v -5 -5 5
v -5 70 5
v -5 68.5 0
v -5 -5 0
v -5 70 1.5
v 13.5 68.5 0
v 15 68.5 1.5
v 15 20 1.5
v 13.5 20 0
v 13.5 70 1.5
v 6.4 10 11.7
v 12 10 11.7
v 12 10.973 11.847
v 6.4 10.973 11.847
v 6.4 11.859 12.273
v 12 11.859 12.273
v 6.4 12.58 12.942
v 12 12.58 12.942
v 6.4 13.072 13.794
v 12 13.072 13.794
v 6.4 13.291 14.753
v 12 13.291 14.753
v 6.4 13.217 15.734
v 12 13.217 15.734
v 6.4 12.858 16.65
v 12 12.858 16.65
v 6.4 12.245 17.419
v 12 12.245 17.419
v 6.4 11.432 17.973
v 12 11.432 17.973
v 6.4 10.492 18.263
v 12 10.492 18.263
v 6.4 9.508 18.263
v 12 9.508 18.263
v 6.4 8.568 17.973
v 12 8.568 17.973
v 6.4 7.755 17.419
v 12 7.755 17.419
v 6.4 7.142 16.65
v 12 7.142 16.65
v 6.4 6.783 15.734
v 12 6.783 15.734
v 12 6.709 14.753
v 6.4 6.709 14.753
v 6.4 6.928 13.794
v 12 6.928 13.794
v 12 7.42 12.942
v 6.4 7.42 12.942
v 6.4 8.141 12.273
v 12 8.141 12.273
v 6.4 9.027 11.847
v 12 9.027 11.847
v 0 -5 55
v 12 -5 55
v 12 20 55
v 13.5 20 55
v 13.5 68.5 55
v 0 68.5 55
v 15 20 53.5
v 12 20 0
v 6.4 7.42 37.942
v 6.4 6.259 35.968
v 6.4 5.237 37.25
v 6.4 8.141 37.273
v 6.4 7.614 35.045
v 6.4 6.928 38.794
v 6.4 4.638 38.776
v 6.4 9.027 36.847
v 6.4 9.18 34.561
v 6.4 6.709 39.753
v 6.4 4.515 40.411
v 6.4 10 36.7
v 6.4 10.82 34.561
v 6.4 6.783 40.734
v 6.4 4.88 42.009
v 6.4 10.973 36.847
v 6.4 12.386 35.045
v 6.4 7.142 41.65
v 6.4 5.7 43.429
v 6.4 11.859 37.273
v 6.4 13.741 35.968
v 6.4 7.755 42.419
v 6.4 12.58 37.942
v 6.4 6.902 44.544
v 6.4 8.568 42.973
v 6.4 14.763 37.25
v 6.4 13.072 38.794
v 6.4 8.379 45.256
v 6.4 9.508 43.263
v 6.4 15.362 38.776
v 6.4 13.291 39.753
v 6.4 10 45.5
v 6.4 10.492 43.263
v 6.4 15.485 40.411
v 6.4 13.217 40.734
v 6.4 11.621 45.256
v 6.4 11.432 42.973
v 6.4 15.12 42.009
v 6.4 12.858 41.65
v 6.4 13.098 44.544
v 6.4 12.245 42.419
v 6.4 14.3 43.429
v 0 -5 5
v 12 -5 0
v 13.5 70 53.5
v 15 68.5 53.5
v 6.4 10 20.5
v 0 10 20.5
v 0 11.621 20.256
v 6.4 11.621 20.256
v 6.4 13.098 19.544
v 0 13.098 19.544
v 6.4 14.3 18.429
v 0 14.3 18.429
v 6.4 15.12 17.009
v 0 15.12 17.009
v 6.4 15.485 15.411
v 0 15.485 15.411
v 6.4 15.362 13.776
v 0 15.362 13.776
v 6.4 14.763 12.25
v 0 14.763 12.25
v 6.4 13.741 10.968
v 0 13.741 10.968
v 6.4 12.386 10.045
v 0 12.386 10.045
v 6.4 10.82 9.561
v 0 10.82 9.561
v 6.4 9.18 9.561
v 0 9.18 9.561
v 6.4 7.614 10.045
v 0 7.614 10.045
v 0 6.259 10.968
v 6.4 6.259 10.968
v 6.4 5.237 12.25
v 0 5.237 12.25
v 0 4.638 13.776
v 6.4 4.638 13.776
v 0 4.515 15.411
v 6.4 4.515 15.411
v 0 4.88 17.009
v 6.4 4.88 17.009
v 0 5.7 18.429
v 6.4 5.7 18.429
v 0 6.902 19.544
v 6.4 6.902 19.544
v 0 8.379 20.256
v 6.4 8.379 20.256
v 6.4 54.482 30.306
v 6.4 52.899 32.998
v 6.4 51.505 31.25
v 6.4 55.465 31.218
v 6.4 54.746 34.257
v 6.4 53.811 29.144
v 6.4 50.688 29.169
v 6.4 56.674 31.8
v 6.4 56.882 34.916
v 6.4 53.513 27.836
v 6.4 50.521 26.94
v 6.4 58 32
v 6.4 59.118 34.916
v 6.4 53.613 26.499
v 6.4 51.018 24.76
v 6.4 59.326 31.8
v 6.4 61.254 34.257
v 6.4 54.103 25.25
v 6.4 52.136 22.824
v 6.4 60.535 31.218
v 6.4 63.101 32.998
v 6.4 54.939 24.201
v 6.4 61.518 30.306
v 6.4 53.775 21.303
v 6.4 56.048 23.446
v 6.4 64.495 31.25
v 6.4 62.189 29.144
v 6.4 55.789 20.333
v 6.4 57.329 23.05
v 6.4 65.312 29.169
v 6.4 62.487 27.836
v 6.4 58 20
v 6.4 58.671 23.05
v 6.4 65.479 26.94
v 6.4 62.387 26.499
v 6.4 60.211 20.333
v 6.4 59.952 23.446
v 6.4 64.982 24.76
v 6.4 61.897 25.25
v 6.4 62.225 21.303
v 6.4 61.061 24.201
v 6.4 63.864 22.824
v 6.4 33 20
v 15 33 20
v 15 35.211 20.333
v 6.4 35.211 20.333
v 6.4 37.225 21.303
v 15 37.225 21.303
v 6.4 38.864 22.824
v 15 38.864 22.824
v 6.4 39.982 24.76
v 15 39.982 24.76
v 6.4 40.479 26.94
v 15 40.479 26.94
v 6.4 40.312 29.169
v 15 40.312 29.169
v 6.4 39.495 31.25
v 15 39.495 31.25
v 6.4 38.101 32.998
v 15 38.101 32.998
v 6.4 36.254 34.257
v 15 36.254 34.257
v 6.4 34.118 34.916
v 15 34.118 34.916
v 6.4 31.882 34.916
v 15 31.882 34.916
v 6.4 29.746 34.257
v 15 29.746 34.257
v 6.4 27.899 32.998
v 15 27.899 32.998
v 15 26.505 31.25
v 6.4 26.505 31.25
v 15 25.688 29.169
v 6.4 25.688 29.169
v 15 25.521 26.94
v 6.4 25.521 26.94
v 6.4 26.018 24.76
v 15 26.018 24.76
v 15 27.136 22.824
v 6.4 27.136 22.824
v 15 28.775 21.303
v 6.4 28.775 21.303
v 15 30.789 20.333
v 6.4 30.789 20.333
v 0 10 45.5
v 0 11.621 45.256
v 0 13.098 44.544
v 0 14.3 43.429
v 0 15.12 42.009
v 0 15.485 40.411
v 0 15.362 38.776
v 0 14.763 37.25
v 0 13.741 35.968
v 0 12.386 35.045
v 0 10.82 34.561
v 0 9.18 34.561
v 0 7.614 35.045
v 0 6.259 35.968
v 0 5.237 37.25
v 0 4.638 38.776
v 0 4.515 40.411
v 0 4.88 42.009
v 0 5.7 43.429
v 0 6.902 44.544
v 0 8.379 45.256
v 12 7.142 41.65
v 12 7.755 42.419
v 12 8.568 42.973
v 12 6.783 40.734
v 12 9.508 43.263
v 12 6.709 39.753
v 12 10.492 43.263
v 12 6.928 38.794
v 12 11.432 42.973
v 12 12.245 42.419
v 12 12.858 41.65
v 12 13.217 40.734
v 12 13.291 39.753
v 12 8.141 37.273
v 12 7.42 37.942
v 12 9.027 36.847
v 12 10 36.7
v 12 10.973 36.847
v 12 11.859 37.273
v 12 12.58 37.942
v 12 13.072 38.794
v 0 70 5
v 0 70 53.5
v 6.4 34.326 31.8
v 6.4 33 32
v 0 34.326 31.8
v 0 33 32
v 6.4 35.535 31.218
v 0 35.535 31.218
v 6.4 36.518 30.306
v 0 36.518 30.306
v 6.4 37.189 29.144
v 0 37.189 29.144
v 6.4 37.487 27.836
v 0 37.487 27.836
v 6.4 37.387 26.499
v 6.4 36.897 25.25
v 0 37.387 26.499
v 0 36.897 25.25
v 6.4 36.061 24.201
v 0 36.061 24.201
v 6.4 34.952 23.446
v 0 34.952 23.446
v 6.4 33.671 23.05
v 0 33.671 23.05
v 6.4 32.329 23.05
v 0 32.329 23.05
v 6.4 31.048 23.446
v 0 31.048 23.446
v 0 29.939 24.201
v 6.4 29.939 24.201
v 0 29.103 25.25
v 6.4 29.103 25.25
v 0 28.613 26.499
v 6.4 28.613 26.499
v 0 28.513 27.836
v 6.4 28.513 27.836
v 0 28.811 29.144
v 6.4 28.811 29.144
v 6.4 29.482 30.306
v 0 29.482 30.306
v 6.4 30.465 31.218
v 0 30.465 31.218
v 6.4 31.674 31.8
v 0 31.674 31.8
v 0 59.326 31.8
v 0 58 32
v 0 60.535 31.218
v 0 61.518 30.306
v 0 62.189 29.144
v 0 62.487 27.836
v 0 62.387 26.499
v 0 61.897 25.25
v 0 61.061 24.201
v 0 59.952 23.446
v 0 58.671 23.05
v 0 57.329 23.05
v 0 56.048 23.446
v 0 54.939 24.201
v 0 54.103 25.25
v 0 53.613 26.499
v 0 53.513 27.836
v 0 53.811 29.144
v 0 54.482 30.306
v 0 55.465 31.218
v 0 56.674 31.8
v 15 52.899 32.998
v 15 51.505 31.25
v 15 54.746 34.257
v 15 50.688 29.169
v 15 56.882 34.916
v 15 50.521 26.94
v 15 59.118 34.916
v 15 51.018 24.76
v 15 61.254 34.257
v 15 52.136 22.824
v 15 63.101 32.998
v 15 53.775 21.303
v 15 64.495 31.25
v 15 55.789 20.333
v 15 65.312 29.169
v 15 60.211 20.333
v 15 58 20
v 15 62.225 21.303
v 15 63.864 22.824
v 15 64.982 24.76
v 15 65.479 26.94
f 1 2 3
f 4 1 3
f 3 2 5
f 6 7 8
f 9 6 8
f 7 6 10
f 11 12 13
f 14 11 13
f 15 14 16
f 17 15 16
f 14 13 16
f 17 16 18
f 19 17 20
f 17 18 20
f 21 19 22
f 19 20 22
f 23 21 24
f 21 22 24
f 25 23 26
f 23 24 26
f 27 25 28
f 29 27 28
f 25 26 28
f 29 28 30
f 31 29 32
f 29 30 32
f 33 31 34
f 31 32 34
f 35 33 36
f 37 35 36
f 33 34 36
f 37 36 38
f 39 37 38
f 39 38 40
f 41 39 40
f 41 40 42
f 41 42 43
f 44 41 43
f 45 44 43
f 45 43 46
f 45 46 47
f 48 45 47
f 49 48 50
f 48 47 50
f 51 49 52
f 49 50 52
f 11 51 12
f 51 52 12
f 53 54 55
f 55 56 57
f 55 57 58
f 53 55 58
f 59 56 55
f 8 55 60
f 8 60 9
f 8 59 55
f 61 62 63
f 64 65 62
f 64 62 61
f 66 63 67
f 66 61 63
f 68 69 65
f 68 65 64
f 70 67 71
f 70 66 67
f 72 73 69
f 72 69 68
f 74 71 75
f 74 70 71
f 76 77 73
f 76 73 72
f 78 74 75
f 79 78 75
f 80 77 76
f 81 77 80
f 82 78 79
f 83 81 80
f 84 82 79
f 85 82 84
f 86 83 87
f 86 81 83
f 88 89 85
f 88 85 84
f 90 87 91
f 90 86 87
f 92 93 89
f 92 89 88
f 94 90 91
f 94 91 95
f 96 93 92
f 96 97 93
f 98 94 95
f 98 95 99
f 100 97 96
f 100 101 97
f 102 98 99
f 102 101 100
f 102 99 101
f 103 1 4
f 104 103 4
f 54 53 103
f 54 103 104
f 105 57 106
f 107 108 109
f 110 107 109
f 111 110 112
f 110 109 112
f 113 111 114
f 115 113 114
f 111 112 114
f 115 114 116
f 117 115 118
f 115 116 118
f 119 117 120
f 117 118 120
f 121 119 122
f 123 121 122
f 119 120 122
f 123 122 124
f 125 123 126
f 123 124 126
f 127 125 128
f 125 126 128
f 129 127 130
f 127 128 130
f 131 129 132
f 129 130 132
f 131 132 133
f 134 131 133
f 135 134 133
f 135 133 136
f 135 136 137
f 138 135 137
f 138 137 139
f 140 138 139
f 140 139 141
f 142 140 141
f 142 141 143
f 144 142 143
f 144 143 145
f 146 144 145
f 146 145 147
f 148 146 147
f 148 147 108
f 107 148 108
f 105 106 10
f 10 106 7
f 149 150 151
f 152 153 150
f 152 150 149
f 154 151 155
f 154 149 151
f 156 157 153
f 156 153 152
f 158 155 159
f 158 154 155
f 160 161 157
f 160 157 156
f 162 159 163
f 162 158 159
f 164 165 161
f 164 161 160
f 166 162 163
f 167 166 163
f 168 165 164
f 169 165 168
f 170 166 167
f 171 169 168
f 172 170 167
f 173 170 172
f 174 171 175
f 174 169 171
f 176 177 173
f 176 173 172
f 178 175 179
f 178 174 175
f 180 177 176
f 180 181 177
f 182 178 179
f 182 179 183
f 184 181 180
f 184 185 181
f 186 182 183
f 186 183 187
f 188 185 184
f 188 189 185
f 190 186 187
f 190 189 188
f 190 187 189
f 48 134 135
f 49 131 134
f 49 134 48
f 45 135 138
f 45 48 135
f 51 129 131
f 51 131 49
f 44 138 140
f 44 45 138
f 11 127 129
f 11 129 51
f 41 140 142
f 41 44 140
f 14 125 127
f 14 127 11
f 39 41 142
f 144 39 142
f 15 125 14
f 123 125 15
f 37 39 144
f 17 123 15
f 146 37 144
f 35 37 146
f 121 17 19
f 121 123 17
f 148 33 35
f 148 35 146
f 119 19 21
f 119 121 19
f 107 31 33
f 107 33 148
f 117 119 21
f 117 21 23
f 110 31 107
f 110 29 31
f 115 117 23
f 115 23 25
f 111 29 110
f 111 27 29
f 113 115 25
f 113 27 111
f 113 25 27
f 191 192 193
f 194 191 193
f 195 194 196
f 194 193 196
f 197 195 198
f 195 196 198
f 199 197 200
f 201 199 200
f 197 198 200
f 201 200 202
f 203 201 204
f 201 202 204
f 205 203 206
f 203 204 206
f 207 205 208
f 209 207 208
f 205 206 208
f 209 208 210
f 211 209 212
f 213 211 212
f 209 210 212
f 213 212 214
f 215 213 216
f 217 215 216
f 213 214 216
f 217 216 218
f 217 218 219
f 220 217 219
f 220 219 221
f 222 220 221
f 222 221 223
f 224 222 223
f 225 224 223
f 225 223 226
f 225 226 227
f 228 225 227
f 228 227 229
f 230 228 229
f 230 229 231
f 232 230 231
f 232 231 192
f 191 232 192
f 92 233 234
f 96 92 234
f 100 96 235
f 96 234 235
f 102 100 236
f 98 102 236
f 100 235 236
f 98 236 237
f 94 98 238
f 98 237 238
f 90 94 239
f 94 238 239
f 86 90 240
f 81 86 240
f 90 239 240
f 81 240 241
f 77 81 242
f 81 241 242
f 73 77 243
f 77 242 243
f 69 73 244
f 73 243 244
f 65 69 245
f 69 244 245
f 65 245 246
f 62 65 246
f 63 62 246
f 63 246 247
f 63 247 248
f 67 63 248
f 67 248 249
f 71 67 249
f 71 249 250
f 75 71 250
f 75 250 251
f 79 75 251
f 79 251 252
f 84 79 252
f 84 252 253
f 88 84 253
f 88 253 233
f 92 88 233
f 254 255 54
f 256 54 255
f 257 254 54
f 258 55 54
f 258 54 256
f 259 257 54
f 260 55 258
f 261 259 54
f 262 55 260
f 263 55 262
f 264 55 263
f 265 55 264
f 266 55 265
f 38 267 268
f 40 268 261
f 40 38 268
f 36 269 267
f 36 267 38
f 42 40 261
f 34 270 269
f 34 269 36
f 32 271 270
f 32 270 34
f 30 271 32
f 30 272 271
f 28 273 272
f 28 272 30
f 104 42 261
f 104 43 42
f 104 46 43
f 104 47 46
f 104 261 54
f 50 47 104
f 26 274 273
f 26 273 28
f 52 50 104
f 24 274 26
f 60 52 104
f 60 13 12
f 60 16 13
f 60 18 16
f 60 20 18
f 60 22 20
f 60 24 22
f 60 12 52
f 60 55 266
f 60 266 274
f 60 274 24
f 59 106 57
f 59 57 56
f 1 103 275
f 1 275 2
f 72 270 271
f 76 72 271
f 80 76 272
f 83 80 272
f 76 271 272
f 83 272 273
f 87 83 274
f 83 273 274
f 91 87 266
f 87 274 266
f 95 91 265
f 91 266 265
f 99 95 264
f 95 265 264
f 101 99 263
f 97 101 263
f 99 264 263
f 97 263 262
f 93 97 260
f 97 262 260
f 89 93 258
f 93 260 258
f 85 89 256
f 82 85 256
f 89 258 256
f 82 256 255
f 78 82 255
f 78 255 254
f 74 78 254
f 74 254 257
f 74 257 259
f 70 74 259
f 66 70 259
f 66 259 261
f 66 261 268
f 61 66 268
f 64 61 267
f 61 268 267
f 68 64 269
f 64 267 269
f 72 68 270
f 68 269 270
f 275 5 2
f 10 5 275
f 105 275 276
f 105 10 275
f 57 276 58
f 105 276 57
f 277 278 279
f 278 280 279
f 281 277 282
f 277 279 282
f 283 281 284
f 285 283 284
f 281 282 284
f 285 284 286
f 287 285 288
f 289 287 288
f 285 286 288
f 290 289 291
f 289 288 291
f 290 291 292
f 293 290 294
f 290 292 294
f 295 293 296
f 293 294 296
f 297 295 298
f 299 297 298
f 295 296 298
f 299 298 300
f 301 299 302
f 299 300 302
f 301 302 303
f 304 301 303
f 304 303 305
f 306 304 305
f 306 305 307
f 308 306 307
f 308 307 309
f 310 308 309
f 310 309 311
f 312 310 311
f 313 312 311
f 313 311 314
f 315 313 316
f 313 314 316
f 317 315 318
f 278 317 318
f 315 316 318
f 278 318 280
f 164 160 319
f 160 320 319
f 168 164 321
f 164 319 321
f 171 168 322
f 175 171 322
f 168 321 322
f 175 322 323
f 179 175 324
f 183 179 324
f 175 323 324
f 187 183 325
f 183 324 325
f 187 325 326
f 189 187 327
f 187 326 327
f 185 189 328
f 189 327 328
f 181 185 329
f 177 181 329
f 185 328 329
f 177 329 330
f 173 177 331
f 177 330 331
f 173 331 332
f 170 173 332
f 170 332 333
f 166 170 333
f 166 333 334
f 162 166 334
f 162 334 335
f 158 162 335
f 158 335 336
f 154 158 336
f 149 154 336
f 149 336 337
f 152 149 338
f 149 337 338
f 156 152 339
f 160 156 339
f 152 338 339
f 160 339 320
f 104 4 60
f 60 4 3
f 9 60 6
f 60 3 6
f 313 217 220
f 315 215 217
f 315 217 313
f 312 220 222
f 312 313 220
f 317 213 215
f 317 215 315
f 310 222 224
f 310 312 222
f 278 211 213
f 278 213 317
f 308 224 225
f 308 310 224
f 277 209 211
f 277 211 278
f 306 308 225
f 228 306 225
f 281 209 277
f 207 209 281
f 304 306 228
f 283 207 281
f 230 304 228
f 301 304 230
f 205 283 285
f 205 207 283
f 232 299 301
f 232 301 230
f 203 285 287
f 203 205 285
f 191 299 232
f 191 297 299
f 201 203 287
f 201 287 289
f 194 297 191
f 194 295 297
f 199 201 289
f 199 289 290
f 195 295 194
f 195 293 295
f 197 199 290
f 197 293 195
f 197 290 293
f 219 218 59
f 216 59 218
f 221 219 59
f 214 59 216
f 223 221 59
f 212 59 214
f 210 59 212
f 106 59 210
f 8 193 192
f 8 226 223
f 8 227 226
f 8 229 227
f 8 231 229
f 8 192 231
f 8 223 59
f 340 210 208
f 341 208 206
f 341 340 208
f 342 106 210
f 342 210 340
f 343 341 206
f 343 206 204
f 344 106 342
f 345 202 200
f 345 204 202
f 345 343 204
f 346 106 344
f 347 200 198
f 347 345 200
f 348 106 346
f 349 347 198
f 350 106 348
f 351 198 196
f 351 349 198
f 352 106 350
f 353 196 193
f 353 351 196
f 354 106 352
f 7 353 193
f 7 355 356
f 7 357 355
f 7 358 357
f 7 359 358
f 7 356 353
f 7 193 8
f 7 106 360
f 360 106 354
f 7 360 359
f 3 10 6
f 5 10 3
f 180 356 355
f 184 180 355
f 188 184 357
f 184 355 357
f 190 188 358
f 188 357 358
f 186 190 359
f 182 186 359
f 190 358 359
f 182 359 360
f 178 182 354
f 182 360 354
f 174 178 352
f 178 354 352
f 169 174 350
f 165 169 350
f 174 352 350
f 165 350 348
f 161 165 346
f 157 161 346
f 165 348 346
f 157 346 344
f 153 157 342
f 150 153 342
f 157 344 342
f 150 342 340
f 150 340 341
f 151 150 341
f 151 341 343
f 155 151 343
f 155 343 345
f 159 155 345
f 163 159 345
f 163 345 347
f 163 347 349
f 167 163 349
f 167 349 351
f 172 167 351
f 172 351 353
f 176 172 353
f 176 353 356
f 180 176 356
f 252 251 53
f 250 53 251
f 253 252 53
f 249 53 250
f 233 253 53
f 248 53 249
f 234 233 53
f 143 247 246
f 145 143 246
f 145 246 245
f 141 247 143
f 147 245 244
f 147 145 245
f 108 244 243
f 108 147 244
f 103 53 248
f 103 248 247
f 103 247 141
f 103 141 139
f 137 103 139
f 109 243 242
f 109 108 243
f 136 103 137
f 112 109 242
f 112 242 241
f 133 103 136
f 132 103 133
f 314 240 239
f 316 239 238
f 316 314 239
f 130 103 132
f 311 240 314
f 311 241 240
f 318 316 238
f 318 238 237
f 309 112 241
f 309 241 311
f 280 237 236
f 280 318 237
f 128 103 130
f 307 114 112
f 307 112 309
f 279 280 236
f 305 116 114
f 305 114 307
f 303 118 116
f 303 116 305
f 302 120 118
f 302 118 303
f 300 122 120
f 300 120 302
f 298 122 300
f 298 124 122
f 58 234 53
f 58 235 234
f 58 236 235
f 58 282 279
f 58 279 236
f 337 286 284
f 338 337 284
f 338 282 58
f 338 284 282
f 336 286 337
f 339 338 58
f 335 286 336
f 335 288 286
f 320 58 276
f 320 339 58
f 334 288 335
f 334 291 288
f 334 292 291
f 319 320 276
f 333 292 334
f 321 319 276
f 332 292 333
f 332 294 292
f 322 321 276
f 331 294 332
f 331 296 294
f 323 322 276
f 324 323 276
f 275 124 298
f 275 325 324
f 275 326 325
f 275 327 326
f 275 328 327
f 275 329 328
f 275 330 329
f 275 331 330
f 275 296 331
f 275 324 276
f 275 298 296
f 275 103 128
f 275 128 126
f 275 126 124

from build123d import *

# Parameters (mm, degrees)
BOSS_EXTRUDE1_DEPTH                                 = 55
SKETCH2_W                                           = 5
SKETCH2_H                                           = 70
BOSS_EXTRUDE2_DEPTH                                 = 5
M5_TAPPED_HOLE1_AT_2_COUNT                          = 2
M5_TAPPED_HOLE1_AT_2_PITCH                          = 20
M5_TAPPED_HOLE1_AT_3_COUNT                          = 2
M5_TAPPED_HOLE1_AT_3_PITCH                          = 40
M5_TAPPED_HOLE1_AT_4_COUNT                          = 2
M5_TAPPED_HOLE1_AT_4_PITCH                          = 60
SKETCH8_W                                           = 104.564197306
SKETCH8_H                                           = 46.562487895
CUT_EXTRUDE1_DEPTH                                  = 87
BOSS_EXTRUDE3_DEPTH                                 = 5
SKETCH10_W                                          = 55
SKETCH10_H                                          = 20
CUT_EXTRUDE2_DEPTH                                  = 3
CBORE_FOR_M6_HEX_SOCKET_HEAD_CAP_SCREW1_D           = 6.6
CBORE_FOR_M6_HEX_SOCKET_HEAD_CAP_SCREW1_CBORE_D     = 11
CBORE_FOR_M6_HEX_SOCKET_HEAD_CAP_SCREW1_CBORE_DEPTH = 6.4
SKETCH13_W                                          = 55
SKETCH13_H                                          = 20
CUT_EXTRUDE3_DEPTH                                  = 5
SKETCH14_W                                          = 5
SKETCH14_H                                          = 55
CUT_EXTRUDE4_DEPTH                                  = 210
SKETCH15_W                                          = 3
SKETCH15_H                                          = 5
CUT_EXTRUDE5_DEPTH                                  = 210
CBORE_FOR_M8_HEX_SOCKET_HEAD_CAP_SCREW1_D           = 9
CBORE_FOR_M8_HEX_SOCKET_HEAD_CAP_SCREW1_CBORE_D     = 15
CBORE_FOR_M8_HEX_SOCKET_HEAD_CAP_SCREW1_CBORE_DEPTH = 8.6
SKETCH18_W                                          = 5
SKETCH18_H                                          = 75
CUT_EXTRUDE6_DEPTH                                  = 210
CHAMFER1_SIZE                                       = 1.5


with BuildPart() as part:
    # Sketch1 → Boss-Extrude1 (new body)
    with BuildSketch(Plane.XY):
        Polygon((0, 0), (110, 0), (110, 20), (20, 20), (20, 70), (0, 70), align=None)
    extrude(amount=BOSS_EXTRUDE1_DEPTH)

    # Sketch2 → Boss-Extrude2 (add)
    with BuildSketch(Plane.ZY):
        with Locations((52.5, 35)):
            Rectangle(SKETCH2_W, SKETCH2_H)
        with Locations((2.5, 35)):
            Rectangle(SKETCH2_W, SKETCH2_H)
    extrude(amount=BOSS_EXTRUDE2_DEPTH)

    # Sketch4 → M5 Tapped Hole1 (revolve, cut)
    with BuildSketch(Plane(origin=(100, 12.5, 55), x_dir=(0, -1, 0), z_dir=(1, 0, 0))):
        Polygon((0, 0), (0, 15.2618073), (2.1, 14), (2.1, 0), align=None)
    m5_tapped_hole1 = revolve(axis=Axis((100, 12.5, 61.35), (0, 0, -1)), mode=Mode.SUBTRACT)

    # M5 Tapped Hole1 at 2: M5 Tapped Hole1 ×2
    with Locations(*[(-i * M5_TAPPED_HOLE1_AT_2_PITCH, 0, 0) for i in range(1, M5_TAPPED_HOLE1_AT_2_COUNT)]):
        add(m5_tapped_hole1, mode=Mode.SUBTRACT)

    # M5 Tapped Hole1 at 3: M5 Tapped Hole1 ×2
    with Locations(*[(-i * M5_TAPPED_HOLE1_AT_3_PITCH, 0, 0) for i in range(1, M5_TAPPED_HOLE1_AT_3_COUNT)]):
        add(m5_tapped_hole1, mode=Mode.SUBTRACT)

    # M5 Tapped Hole1 at 4: M5 Tapped Hole1 ×2
    with Locations(*[(-i * M5_TAPPED_HOLE1_AT_4_PITCH, 0, 0) for i in range(1, M5_TAPPED_HOLE1_AT_4_COUNT)]):
        add(m5_tapped_hole1, mode=Mode.SUBTRACT)

    # Mirror1: M5 Tapped Hole1 across plane
    add(m5_tapped_hole1.mirror(Plane.XY.offset(27.5)), mode=Mode.SUBTRACT)

    # Mirror1 copy 1 sketch → Mirror1 copy 1 (revolve, cut)
    with BuildSketch(Plane(origin=(80, 12.5, 0), x_dir=(0, -1, 0), z_dir=(1, 0, 0))):
        Polygon((0, 0), (0, -15.2618073), (2.1, -14), (2.1, 0), align=None)
    revolve(axis=Axis((80, 12.5, -6.35), (0, 0, -1)), mode=Mode.SUBTRACT)

    # Mirror1 copy 2 sketch → Mirror1 copy 2 (revolve, cut)
    with BuildSketch(Plane(origin=(60, 12.5, 0), x_dir=(0, -1, 0), z_dir=(1, 0, 0))):
        Polygon((0, 0), (0, -15.2618073), (2.1, -14), (2.1, 0), align=None)
    revolve(axis=Axis((60, 12.5, -6.35), (0, 0, -1)), mode=Mode.SUBTRACT)

    # Mirror1 copy 3 sketch → Mirror1 copy 3 (revolve, cut)
    with BuildSketch(Plane(origin=(40, 12.5, 0), x_dir=(0, -1, 0), z_dir=(1, 0, 0))):
        Polygon((0, 0), (0, -15.2618073), (2.1, -14), (2.1, 0), align=None)
    revolve(axis=Axis((40, 12.5, -6.35), (0, 0, -1)), mode=Mode.SUBTRACT)

    # Sketch8 → Cut-Extrude1 (cut)
    with BuildSketch(Plane.XY.offset(55)):
        with Locations((72.282098653, 13.535500523)):
            Rectangle(SKETCH8_W, SKETCH8_H)
    extrude(amount=-CUT_EXTRUDE1_DEPTH, mode=Mode.SUBTRACT)

    # Sketch9 → Boss-Extrude3 (add)
    with BuildSketch(Plane.XZ):
        Polygon((-5, 55), (-5, 50), (0, 50), (0, 5), (-5, 5), (-5, 0), (20, 0), (20, 55), align=None)
    extrude(amount=BOSS_EXTRUDE3_DEPTH)

    # Sketch10 → Cut-Extrude2 (cut)
    with BuildSketch(Plane(origin=(20, 0, 0), x_dir=(0, 0, -1), z_dir=(1, 0, 0))):
        with Locations((-27.5, 10)):
            Rectangle(SKETCH10_W, SKETCH10_H)
    extrude(amount=-CUT_EXTRUDE2_DEPTH, mode=Mode.SUBTRACT)

    # CBORE for M6 Hex Socket Head Cap Screw1 (through all)
    with Locations(Plane.ZY):
        with Locations((15, 10), (40, 10)):
            CounterBoreHole(CBORE_FOR_M6_HEX_SOCKET_HEAD_CAP_SCREW1_D / 2, CBORE_FOR_M6_HEX_SOCKET_HEAD_CAP_SCREW1_CBORE_D / 2, CBORE_FOR_M6_HEX_SOCKET_HEAD_CAP_SCREW1_CBORE_DEPTH)

    # Sketch13 → Cut-Extrude3 (cut)
    with BuildSketch(Plane(origin=(17, 0, 0), x_dir=(0, 0, -1), z_dir=(1, 0, 0))):
        with Locations((-27.5, 10)):
            Rectangle(SKETCH13_W, SKETCH13_H)
    extrude(amount=-CUT_EXTRUDE3_DEPTH, mode=Mode.SUBTRACT)

    # Sketch14 → Cut-Extrude4 (cut)
    with BuildSketch(Plane(origin=(0, 70, 0), x_dir=(1, 0, 0), z_dir=(0, 1, 0))):
        with Locations((17.5, -27.5)):
            Rectangle(SKETCH14_W, SKETCH14_H)
    extrude(amount=-CUT_EXTRUDE4_DEPTH, mode=Mode.SUBTRACT)

    # Sketch15 → Cut-Extrude5 (cut)
    with BuildSketch(Plane.XY.offset(55)):
        with Locations((13.5, -2.5)):
            Rectangle(SKETCH15_W, SKETCH15_H)
    extrude(amount=-CUT_EXTRUDE5_DEPTH, mode=Mode.SUBTRACT)

    # CBORE for M8 Hex Socket Head Cap Screw1 (through all)
    with Locations(Plane(origin=(15, 0, 0), x_dir=(0, 0, -1), z_dir=(1, 0, 0))):
        with Locations((-27.5, 58), (-27.5, 33)):
            CounterBoreHole(CBORE_FOR_M8_HEX_SOCKET_HEAD_CAP_SCREW1_D / 2, CBORE_FOR_M8_HEX_SOCKET_HEAD_CAP_SCREW1_CBORE_D / 2, CBORE_FOR_M8_HEX_SOCKET_HEAD_CAP_SCREW1_CBORE_DEPTH)

    # Sketch18 → Cut-Extrude6 (cut)
    with BuildSketch(Plane(origin=(0, 0, 50), x_dir=(-1, 0, 0), z_dir=(0, 0, -1))):
        with Locations((2.5, 32.5)):
            Rectangle(SKETCH18_W, SKETCH18_H)
    extrude(amount=-CUT_EXTRUDE6_DEPTH, mode=Mode.SUBTRACT)

    # Chamfer1
    chamfer1_edges = [part.edges().sort_by_distance(p)[0] for p in [
        (5, 70, 0),
        (7.5, 70, 55),
        (15, 45, 55),
        (15, 45, 0),
        (15, 70, 27.5),
    ]]
    chamfer(chamfer1_edges, length=CHAMFER1_SIZE)


solid = part.part
